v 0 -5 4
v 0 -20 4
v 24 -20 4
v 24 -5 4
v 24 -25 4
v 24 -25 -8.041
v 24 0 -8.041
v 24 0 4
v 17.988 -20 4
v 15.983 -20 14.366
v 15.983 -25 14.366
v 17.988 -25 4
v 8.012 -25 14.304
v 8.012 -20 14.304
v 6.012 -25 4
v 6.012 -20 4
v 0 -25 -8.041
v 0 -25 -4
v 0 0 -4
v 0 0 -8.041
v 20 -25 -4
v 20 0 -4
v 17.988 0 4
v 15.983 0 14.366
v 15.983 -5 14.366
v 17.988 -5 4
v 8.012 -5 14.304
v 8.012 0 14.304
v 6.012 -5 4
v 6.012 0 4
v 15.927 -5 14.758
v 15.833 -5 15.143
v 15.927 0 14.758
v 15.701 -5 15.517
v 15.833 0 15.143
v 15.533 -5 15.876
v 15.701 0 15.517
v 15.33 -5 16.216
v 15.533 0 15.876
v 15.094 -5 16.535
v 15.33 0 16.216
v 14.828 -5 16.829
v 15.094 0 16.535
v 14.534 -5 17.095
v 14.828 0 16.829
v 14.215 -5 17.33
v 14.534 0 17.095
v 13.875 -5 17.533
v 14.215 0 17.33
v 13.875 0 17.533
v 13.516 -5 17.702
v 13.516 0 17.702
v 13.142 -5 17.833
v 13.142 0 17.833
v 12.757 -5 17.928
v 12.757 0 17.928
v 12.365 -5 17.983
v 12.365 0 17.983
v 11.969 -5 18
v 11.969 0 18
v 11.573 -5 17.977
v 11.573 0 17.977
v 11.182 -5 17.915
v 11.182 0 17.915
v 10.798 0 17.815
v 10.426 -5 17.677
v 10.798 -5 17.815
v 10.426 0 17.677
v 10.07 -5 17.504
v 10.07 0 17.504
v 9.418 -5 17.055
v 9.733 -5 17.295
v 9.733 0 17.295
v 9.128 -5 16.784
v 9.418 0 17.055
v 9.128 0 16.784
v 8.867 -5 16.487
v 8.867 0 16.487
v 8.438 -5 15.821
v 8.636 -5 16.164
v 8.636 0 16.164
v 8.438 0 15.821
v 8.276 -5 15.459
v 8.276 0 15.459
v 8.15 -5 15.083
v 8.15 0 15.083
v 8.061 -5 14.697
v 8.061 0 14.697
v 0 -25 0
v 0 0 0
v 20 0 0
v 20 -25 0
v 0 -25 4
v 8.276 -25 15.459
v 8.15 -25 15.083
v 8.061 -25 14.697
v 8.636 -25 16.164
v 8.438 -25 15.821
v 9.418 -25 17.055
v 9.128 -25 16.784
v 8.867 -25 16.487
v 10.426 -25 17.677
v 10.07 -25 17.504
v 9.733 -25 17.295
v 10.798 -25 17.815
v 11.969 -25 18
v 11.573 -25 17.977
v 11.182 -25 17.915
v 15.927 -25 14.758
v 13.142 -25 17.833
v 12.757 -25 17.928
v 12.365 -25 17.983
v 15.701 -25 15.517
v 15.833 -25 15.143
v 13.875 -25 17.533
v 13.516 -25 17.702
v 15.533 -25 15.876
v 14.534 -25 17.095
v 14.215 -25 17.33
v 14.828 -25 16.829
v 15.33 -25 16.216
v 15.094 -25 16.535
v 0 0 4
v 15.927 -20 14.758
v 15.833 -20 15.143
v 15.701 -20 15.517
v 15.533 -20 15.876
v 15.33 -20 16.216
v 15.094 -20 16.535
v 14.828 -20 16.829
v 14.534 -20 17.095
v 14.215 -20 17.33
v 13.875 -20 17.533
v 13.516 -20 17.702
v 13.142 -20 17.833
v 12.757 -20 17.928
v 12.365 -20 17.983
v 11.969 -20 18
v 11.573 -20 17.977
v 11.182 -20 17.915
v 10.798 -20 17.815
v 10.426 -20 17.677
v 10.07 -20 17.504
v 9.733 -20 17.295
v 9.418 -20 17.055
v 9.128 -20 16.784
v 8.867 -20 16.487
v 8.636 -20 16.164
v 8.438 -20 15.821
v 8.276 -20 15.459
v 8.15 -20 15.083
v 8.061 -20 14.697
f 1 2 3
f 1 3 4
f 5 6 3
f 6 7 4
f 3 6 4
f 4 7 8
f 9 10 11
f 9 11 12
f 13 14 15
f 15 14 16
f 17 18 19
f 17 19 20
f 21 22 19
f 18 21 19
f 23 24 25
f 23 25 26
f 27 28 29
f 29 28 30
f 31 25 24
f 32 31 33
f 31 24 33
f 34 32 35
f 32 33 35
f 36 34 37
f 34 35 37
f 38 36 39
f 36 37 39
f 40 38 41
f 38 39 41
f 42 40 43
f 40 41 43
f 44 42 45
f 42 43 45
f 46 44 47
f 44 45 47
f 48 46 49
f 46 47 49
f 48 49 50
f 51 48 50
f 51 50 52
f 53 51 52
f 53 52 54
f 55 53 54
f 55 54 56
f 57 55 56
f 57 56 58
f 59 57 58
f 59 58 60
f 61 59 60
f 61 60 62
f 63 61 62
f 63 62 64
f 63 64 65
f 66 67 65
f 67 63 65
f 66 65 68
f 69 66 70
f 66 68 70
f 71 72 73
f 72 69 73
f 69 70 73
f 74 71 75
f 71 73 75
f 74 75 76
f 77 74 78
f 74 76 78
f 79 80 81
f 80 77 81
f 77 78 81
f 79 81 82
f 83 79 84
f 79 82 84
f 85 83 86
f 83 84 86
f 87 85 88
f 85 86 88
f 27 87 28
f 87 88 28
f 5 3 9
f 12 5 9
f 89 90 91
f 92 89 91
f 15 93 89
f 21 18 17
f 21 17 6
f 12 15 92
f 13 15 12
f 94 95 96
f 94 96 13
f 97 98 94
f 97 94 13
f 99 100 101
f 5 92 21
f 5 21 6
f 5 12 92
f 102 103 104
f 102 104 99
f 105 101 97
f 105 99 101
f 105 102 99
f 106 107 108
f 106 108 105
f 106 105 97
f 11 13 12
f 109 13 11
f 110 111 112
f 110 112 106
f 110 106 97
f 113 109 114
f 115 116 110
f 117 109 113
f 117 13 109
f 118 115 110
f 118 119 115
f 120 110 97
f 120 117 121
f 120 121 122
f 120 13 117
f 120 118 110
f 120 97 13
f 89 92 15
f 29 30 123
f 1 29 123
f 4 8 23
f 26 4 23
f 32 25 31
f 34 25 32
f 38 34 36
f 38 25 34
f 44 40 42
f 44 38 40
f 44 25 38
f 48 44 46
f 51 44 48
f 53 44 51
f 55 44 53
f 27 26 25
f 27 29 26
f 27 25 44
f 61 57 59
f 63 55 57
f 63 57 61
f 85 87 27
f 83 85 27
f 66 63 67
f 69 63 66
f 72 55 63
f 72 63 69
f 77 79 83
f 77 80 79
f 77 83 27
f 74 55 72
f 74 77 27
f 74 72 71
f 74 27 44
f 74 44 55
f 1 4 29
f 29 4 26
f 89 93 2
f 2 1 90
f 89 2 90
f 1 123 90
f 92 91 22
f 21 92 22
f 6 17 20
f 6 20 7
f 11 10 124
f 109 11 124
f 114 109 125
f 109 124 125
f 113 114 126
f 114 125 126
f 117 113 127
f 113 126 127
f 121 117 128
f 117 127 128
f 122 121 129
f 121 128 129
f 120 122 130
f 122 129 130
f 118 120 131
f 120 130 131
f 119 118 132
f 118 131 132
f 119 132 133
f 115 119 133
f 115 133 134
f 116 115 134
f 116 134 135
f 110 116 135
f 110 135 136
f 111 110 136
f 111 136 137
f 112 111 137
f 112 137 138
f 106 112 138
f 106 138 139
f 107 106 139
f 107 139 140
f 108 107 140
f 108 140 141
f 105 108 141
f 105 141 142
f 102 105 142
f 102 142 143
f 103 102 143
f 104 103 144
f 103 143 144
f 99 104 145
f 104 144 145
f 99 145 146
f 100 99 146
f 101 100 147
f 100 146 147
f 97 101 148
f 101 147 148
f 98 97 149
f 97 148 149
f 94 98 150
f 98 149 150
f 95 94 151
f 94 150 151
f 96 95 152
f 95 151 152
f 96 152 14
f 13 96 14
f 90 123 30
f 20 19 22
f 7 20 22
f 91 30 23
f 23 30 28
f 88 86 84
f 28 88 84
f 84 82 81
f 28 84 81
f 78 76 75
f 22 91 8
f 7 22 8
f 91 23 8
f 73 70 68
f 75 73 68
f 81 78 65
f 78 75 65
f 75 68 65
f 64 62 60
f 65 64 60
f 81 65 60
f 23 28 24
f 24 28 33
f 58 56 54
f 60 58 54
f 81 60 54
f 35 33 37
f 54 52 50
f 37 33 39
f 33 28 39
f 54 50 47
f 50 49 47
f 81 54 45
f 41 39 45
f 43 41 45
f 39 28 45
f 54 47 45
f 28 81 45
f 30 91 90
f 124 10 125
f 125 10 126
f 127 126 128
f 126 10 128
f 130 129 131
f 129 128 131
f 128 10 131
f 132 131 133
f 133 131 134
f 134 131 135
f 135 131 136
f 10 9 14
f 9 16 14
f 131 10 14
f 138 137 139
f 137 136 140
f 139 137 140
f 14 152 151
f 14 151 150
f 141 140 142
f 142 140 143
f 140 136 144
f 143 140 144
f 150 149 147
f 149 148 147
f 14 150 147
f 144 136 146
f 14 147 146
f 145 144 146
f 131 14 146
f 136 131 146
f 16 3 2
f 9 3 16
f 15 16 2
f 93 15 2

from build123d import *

# Parameters (mm, degrees)
PAD_DEPTH         = 25
SKETCH001_W       = 15
SKETCH001_H       = 16.832567
POCKET_DEPTH      = 0.001
POCKET_DEPTH_BACK = -24.001


with BuildPart() as part:
    # Sketch → Pad (new body)
    with BuildSketch(Plane.XZ):
        with BuildLine():
            Line((0, 0), (20, 0))
            Line((20, 0), (20, -4))
            Line((20, -4), (0, -4))
            Line((0, -4), (0, -8.041044))
            Line((0, -8.041044), (24, -8.041044))
            Line((24, -8.041044), (24, 4))
            Line((24, 4), (17.988441, 4))
            Line((15.983215, 14.366061), (17.988441, 4))
            ThreePointArc((15.983215, 14.366061), (11.968793, 17.999878), (8.011559, 14.303867))
            Line((8.011559, 14.303867), (6.011559, 4))
            Line((6.011559, 4), (0, 4))
            Line((0, 4), (0, 0))
        make_face()
    extrude(amount=PAD_DEPTH)

    # Sketch001 → Pocket (cut, two sides)
    with BuildSketch(Plane.YZ) as pocket_sk:
        with Locations((-12.5, 12.416283)):
            Rectangle(SKETCH001_W, SKETCH001_H)
    extrude(amount=-POCKET_DEPTH, mode=Mode.SUBTRACT)
    extrude(pocket_sk.sketch, amount=-POCKET_DEPTH_BACK, mode=Mode.SUBTRACT)


solid = part.part
